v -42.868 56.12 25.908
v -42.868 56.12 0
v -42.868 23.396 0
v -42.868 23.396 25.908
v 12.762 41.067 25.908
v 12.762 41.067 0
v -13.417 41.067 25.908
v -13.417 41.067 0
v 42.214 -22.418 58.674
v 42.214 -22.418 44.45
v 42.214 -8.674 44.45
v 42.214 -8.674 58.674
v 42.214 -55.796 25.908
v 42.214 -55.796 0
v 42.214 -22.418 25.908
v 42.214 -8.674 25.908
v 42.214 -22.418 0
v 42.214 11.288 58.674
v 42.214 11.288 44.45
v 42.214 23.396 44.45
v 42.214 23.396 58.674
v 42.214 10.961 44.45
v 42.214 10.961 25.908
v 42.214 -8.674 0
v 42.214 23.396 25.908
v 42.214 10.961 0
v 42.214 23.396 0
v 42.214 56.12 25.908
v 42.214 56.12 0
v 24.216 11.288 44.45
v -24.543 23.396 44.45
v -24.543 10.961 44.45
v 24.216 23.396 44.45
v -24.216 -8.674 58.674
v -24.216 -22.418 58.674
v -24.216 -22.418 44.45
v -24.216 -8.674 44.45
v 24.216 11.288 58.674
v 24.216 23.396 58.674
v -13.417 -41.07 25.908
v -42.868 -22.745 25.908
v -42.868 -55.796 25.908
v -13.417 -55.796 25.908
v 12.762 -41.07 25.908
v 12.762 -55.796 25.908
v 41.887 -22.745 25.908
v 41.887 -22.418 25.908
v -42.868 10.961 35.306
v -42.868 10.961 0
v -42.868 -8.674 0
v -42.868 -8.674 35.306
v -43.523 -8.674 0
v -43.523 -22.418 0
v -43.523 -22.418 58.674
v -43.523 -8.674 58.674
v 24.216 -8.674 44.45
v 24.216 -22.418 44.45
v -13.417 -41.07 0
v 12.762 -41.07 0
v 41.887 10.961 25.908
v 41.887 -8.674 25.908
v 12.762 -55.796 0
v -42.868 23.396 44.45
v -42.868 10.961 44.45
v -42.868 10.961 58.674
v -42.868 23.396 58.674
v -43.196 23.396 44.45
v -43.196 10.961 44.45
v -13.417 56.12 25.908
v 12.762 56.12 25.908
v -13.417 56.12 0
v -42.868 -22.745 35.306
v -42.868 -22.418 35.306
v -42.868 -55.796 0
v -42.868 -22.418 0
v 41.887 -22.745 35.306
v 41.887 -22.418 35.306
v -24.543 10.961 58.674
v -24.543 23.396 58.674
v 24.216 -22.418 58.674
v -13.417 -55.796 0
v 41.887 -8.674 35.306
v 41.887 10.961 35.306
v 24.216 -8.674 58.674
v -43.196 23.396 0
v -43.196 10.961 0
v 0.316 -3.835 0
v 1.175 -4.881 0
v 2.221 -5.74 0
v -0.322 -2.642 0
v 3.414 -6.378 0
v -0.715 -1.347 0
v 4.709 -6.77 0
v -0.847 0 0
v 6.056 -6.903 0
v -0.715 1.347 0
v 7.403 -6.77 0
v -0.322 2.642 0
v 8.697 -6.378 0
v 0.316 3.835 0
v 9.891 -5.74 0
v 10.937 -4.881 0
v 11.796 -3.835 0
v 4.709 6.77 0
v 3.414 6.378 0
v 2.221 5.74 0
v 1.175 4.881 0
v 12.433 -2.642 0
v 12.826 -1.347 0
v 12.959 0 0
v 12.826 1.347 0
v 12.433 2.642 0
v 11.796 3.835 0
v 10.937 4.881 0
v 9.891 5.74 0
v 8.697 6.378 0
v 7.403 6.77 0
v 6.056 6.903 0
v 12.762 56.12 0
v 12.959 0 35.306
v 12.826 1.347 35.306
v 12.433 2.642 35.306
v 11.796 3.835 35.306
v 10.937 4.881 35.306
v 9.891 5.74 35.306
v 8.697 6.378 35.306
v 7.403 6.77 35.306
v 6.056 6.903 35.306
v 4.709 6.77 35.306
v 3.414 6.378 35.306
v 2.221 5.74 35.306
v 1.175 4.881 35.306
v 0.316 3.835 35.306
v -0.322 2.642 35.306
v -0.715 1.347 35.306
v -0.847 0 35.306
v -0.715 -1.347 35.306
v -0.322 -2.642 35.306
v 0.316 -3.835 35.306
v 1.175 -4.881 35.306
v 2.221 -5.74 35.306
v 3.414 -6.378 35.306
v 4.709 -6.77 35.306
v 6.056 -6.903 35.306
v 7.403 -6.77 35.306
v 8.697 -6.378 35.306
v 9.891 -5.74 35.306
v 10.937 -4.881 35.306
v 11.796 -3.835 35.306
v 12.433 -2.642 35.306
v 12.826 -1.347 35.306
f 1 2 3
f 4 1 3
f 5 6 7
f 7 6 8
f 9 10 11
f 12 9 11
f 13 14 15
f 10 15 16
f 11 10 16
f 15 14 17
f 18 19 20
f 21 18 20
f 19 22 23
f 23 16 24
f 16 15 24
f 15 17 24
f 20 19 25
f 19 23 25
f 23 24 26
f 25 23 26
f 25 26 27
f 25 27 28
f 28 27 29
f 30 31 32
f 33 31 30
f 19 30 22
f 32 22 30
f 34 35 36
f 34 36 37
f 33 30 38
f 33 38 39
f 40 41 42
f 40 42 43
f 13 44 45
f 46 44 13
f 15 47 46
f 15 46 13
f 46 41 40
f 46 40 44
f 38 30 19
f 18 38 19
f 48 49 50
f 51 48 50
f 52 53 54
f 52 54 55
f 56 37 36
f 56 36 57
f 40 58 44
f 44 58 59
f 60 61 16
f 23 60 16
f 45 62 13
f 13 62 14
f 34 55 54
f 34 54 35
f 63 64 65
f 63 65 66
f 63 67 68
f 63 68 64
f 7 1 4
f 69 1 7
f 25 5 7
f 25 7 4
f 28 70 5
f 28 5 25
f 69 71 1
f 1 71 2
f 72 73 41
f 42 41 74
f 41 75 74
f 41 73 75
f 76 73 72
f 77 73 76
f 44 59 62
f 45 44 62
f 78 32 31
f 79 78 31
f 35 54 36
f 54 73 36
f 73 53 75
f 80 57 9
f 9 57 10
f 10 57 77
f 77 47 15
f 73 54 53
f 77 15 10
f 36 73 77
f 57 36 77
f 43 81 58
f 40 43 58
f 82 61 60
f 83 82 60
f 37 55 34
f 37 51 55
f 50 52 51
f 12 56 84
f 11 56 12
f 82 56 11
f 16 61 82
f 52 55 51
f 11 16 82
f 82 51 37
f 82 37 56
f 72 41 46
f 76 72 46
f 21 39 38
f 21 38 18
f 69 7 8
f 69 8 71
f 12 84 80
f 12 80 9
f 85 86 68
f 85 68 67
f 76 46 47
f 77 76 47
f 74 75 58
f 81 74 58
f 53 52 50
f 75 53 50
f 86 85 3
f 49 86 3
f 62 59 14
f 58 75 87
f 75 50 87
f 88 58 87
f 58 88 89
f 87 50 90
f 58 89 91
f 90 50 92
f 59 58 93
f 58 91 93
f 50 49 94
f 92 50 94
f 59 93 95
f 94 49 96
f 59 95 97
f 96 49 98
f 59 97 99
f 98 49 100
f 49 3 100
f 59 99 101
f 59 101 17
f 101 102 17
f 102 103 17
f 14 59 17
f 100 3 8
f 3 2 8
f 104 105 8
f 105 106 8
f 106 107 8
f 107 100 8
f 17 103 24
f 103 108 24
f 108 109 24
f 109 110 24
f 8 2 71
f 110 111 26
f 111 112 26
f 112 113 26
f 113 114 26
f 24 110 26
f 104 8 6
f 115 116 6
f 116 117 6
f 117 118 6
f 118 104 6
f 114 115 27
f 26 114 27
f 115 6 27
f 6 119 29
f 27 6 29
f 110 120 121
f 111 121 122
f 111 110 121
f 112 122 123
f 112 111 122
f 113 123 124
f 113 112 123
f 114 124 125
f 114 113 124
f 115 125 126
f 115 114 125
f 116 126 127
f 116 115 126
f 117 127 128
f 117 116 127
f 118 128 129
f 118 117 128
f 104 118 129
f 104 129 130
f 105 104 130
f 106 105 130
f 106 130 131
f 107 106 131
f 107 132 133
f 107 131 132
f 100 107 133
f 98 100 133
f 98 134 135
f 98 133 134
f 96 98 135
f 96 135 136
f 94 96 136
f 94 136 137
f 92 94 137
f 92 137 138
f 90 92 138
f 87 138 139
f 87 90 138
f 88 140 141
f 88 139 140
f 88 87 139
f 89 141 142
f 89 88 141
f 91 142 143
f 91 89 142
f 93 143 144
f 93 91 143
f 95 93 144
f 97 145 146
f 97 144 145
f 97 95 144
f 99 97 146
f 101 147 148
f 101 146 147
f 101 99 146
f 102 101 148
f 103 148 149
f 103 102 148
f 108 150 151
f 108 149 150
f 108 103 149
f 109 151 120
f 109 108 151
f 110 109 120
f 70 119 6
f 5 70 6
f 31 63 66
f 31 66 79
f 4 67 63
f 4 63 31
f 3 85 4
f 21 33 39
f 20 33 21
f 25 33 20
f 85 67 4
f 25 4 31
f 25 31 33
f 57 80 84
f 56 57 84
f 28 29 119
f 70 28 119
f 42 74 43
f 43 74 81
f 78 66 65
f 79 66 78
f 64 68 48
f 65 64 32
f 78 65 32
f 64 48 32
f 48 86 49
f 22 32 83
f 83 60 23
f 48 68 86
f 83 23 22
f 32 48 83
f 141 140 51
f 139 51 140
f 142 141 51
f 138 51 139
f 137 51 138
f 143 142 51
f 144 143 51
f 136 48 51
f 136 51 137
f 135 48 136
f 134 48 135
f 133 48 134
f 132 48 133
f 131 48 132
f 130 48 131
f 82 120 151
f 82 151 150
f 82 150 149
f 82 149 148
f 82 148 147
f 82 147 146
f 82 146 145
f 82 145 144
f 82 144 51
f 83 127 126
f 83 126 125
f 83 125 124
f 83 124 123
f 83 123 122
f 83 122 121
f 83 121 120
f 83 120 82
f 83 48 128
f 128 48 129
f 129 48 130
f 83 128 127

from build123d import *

# Parameters (mm, degrees)
F1_DEPTH = 25.908
F2_W     = 84.75497365
F2_H     = 46.1407359689
F3_DEPTH = 35.306
F4_W     = 85.4094512761
F4_H     = 12.4350916594
F4_H_2   = 13.7440478429
F5_DEPTH = 44.45
F6_W     = 18.3254014701
F6_H     = 12.4350916594
F6_W_2   = 17.998162657
F6_H_2   = 12.1078519151
F6_W_3   = 19.3071179092
F6_H_3   = 13.7440478429
F7_DEPTH = 58.674
F8_R     = 6.9031193851
F9_DEPTH = 43.942


with BuildPart() as f1:
    # F0 (on Top) → F1 (new body)
    with BuildSketch(Plane.XY):
        Polygon((-13.4168099612, 56.1196766794), (-42.8683459759, 56.1196766794), (-42.8683459759, -55.7961538434), (-13.4168099612, -55.7961538434), (-13.4168099612, -41.0703867674), (12.7623323351, -41.0703867674), (12.7623323351, -55.7961538434), (42.2138683498, -55.7961538434), (42.2138683498, 56.1196766794), (12.7623323351, 56.1196766794), (12.7623323351, 41.0666689277), (-13.4168099612, 41.0666689277), align=None)
    extrude(amount=F1_DEPTH)

    # F2 (on Top) → F3 (join)
    with BuildSketch(Plane.XY):
        with Locations((-0.4908591509, 0.3253789619)):
            Rectangle(F2_W, F2_H)
    extrude(amount=F3_DEPTH)

    # F4 (on Top) → F5 (join)
    with BuildSketch(Plane.XY):
        with Locations((-0.4908572882, 17.1782011166)):
            Rectangle(F4_W, F4_H)
        with Locations((-0.4908572882, -15.5457244255)):
            Rectangle(F4_W, F4_H_2)
    extrude(amount=F5_DEPTH)

    # F6 (on Top) → F7 (join)
    with BuildSketch(Plane.XY):
        with Locations((-33.7056452408, 17.1782011166)):
            Rectangle(F6_W, F6_H)
        with Locations((33.2147870213, 17.3418209888)):
            Rectangle(F6_W_2, F6_H_2)
        with Locations((-33.8692646474, -15.5457244255)):
            Rectangle(F6_W_3, F6_H_3)
        with Locations((33.2147870213, -15.5457244255)):
            Rectangle(F6_W_2, F6_H_3)
    extrude(amount=F7_DEPTH)

    # F8 (on Top) → F9 (cut)
    with BuildSketch(Plane.XY):
        with Locations((6.05578674, 0)):
            Circle(F8_R)
    extrude(amount=F9_DEPTH, mode=Mode.SUBTRACT)


solid = f1.part
